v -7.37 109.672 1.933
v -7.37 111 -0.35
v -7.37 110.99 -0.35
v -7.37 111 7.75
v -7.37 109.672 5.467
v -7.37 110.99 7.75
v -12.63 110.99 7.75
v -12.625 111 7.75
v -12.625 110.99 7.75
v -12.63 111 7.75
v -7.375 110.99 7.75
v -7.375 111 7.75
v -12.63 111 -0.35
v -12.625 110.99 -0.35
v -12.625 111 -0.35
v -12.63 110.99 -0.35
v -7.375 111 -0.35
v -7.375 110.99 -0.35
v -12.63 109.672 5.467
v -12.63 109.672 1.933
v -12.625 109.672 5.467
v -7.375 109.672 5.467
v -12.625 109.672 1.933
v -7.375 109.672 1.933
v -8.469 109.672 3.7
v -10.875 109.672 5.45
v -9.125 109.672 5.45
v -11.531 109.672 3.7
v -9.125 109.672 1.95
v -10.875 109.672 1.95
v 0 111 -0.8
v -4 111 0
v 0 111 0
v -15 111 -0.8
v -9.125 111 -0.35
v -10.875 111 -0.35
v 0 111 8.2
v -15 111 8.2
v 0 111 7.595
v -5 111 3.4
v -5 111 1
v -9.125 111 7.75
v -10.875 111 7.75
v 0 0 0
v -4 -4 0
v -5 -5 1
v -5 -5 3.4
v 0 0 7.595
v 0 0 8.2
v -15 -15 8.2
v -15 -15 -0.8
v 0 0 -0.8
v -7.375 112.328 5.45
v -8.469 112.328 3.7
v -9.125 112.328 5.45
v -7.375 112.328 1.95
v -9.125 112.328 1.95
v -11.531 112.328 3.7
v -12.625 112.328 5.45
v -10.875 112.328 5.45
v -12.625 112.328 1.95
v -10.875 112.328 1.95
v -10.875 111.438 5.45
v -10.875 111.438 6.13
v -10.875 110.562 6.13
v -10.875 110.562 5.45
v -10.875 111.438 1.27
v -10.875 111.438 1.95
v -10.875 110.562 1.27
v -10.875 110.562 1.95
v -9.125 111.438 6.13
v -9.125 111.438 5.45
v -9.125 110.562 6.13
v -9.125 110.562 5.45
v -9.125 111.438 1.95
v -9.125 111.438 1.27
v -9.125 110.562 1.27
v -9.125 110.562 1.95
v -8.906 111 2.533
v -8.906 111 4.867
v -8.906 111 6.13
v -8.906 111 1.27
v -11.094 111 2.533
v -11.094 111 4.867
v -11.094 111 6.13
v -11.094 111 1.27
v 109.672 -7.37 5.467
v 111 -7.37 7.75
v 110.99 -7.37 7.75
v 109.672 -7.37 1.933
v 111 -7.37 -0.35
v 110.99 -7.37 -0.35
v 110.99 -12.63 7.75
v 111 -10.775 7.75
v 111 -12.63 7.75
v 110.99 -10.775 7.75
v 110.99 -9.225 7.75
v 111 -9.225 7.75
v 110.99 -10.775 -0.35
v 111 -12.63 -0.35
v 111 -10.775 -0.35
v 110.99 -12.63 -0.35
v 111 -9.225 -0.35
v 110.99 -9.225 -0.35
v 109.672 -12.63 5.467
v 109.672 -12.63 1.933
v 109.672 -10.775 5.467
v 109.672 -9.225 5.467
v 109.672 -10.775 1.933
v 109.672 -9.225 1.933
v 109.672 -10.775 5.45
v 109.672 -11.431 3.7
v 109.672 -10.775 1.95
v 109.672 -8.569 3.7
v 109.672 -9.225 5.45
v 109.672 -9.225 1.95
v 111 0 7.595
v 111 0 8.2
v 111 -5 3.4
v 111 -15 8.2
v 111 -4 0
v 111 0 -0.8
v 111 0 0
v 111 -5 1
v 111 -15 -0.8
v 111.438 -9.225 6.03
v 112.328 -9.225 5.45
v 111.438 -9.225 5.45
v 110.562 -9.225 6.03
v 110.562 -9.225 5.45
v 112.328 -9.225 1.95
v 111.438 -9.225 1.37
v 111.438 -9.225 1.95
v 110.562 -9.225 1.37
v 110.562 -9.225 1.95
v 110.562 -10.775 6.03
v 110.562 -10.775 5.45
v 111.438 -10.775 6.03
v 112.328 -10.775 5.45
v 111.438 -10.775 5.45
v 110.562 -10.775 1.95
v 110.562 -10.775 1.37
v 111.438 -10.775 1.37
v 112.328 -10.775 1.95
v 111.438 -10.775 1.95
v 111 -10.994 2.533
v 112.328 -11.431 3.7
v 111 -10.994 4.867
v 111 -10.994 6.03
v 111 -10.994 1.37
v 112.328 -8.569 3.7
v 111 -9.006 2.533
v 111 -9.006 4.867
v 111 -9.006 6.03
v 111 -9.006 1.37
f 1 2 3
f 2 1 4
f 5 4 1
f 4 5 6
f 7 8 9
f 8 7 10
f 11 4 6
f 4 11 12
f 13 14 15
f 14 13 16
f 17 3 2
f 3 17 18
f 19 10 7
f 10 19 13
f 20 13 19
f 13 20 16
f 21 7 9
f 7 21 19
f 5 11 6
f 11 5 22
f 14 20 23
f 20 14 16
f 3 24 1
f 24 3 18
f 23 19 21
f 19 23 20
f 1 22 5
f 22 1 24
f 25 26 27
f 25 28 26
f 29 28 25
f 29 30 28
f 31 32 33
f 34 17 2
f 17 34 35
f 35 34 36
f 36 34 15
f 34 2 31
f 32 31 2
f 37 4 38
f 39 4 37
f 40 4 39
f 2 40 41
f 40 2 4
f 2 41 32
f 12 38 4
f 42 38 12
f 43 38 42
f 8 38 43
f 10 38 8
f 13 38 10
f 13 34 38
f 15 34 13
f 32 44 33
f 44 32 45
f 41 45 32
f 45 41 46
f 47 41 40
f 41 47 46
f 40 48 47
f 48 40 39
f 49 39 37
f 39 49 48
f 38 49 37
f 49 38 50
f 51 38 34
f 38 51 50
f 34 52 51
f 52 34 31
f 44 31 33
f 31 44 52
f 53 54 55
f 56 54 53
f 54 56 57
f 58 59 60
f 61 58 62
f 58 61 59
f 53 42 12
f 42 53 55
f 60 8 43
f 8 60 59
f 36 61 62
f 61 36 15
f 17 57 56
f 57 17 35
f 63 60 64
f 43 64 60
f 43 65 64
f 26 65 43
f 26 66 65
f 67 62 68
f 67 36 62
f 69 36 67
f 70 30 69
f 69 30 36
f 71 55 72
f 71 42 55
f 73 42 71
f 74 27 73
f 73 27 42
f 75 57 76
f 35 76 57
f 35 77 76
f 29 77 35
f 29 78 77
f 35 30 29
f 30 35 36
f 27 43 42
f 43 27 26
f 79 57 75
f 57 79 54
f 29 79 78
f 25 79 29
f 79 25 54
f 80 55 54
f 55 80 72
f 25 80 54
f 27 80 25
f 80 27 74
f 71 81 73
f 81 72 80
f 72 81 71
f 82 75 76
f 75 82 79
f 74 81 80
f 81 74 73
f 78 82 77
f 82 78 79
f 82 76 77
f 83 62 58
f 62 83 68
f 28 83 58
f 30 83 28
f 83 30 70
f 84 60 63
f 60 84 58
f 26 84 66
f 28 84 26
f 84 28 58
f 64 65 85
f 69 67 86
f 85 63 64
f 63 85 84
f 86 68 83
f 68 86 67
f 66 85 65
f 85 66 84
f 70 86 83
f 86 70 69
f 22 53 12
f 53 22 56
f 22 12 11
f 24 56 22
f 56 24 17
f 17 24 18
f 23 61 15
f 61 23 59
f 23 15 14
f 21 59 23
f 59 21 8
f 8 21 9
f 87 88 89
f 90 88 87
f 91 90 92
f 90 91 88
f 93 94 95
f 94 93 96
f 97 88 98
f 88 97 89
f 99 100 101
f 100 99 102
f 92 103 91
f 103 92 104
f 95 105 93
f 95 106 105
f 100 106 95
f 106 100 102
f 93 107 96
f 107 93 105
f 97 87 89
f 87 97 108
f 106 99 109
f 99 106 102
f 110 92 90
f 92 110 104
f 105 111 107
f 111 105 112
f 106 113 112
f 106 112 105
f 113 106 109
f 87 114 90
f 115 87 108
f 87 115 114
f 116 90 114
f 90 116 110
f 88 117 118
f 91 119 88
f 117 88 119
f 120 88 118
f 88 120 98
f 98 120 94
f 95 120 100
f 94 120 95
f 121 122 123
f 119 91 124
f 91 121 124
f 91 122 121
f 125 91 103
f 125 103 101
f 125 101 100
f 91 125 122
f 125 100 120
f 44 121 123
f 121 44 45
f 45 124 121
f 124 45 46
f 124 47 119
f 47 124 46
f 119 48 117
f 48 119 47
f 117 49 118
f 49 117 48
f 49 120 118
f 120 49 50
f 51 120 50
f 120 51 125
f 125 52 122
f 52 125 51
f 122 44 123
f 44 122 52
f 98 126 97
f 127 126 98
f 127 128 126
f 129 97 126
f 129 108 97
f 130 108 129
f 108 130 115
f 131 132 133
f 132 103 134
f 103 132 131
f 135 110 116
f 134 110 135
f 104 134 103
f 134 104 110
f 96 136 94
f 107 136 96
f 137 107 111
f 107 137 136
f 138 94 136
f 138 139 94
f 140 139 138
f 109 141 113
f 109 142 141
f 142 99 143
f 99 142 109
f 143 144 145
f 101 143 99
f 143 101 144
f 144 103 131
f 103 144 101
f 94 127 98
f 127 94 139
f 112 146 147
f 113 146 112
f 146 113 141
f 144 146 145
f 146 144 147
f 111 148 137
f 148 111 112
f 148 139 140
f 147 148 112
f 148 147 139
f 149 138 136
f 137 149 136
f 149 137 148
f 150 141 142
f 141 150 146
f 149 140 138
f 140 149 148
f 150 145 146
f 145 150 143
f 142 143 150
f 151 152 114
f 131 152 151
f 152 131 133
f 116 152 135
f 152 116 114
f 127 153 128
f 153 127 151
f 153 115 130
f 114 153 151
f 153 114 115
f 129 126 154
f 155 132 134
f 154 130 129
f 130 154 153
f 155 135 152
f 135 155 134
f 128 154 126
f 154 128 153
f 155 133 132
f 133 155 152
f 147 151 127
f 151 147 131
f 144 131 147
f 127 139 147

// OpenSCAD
include <BOSL/constants.scad>
use <BOSL/transforms.scad>
use <BOSL/shapes.scad>
use <BOSL/masks.scad>
use <BOSL/math.scad>
use <BOSLext/joiners.scad>
// use <BOSL/joiners.scad>

lh=0.2;
lw=0.45;
print_bed=[250,210,210];

board_th=up(25.4/8);
frame_base_th=up(0.8);
frame_w=15;
frame_board_inset=5;

clearance=up(0.2);
overhang=50;
frame_th=up(max(6,board_th+clearance+frame_board_inset/tan(overhang)+frame_base_th+lh*3));

frame=[222,222];
// frame(w=frame.x,h=frame.y);
corner(w=frame.x/2,h=frame.y/2);
// h=frame.x;
// w=frame.y;
*right_half(cp=-w/2-$t*(frame_w+0.1),s=w*2) {
  translate([-w/2,-h/2]) rotate(  0) corner(w/2,h/2);
  translate([-w/2, h/2]) rotate(-90) corner(w/2,h/2);
}
*xdistribute(spacing=frame_w+5) {
  corner_piece(l=20);
  corner_piece(l=20, odd=true);
}




// w=15;
// h=w*2;
// align=V_FRONT;
// orient=ORIENT_Y;
// // ydistribute(spacing=w+20) {
// difference() {
// // intersection() {
//   cuboid([w,20,h]);
//   half_joiner(w=w,h=w*2,l=w,orient=orient,force=true)
//     cuboid([w+2,w+2,h+2],align=align);
//   yflip() half_joiner2(w=w,h=w*2,l=w,orient=orient,force=true)
//     cuboid([w+2,w+2,h+2],align=align);
// }


module frame(w,h) {
  ps=[
    [-w/2,-h/2,   0],
    [-w/2, h/2, -90],
    [ w/2, h/2,-180],
    [ w/2,-h/2,-270],
  ]+[
    [-2,-2,   0],
    [-2, 2,   0],
    [ 2, 2,   0],
    [ 2,-2,   0],
  ];
  for (p=ps) {
    translate([p.x,p.y]) rotate(p[2]) corner(w/2,h/2);
  }
}

module corner(w,h) {
  corner_piece(h);
  yflip() zrot(-90) corner_piece(w,odd=true);
}
module corner_piece(l,odd=false) {
  jh=frame_th*0.9;
  jw=0.35*frame_w;
  union() {
    difference() {
      ymove(l) rotate([90,0]) linear_extrude(l+frame_w) frame_section();
      chamfer_mask(l=frame_w*2,chamfer=frame_w*2,align=V_FRONT+V_RIGHT);
      translate([-frame_w*2/3,l,frame_th/2-frame_base_th]) joiners_clear(h=jh,w=jw);
    }
    translate([-frame_w*2/3,l,frame_th/2-frame_base_th]) joiners(h=jh,w=jw,odd=odd);
  }
}

module frame_section() {
  polygon([
    [                 0,0],
    [-frame_board_inset+1,0],
    [-frame_board_inset,1],
    [-frame_board_inset,board_th+clearance],
    [                 0,board_th+clearance+frame_board_inset/tan(overhang)],
    [                 0,frame_th-frame_base_th],
    [          -frame_w,frame_th-frame_base_th],
    [          -frame_w,-frame_base_th],
    [                 0,-frame_base_th]
  ]);
}

module joiners_clear(h,w) {
  for(i=[h,w]) assert_defined(i);

  half_joiner_clear(h=h,w=w,force=true);
}

module joiners(h,w,odd) {
  for(i=[h,w,odd]) assert_defined(i);

  if(odd) {
    half_joiner( h=h,w=w,l=15,slop=0.1,force=true);
  } else {
    half_joiner2(h=h,w=w,l=15,force=true);
  }
}


module assert_defined(x,msg) {
  assert(!is_undef(x),msg);
}
function up(x)=quantup(x,lh);
